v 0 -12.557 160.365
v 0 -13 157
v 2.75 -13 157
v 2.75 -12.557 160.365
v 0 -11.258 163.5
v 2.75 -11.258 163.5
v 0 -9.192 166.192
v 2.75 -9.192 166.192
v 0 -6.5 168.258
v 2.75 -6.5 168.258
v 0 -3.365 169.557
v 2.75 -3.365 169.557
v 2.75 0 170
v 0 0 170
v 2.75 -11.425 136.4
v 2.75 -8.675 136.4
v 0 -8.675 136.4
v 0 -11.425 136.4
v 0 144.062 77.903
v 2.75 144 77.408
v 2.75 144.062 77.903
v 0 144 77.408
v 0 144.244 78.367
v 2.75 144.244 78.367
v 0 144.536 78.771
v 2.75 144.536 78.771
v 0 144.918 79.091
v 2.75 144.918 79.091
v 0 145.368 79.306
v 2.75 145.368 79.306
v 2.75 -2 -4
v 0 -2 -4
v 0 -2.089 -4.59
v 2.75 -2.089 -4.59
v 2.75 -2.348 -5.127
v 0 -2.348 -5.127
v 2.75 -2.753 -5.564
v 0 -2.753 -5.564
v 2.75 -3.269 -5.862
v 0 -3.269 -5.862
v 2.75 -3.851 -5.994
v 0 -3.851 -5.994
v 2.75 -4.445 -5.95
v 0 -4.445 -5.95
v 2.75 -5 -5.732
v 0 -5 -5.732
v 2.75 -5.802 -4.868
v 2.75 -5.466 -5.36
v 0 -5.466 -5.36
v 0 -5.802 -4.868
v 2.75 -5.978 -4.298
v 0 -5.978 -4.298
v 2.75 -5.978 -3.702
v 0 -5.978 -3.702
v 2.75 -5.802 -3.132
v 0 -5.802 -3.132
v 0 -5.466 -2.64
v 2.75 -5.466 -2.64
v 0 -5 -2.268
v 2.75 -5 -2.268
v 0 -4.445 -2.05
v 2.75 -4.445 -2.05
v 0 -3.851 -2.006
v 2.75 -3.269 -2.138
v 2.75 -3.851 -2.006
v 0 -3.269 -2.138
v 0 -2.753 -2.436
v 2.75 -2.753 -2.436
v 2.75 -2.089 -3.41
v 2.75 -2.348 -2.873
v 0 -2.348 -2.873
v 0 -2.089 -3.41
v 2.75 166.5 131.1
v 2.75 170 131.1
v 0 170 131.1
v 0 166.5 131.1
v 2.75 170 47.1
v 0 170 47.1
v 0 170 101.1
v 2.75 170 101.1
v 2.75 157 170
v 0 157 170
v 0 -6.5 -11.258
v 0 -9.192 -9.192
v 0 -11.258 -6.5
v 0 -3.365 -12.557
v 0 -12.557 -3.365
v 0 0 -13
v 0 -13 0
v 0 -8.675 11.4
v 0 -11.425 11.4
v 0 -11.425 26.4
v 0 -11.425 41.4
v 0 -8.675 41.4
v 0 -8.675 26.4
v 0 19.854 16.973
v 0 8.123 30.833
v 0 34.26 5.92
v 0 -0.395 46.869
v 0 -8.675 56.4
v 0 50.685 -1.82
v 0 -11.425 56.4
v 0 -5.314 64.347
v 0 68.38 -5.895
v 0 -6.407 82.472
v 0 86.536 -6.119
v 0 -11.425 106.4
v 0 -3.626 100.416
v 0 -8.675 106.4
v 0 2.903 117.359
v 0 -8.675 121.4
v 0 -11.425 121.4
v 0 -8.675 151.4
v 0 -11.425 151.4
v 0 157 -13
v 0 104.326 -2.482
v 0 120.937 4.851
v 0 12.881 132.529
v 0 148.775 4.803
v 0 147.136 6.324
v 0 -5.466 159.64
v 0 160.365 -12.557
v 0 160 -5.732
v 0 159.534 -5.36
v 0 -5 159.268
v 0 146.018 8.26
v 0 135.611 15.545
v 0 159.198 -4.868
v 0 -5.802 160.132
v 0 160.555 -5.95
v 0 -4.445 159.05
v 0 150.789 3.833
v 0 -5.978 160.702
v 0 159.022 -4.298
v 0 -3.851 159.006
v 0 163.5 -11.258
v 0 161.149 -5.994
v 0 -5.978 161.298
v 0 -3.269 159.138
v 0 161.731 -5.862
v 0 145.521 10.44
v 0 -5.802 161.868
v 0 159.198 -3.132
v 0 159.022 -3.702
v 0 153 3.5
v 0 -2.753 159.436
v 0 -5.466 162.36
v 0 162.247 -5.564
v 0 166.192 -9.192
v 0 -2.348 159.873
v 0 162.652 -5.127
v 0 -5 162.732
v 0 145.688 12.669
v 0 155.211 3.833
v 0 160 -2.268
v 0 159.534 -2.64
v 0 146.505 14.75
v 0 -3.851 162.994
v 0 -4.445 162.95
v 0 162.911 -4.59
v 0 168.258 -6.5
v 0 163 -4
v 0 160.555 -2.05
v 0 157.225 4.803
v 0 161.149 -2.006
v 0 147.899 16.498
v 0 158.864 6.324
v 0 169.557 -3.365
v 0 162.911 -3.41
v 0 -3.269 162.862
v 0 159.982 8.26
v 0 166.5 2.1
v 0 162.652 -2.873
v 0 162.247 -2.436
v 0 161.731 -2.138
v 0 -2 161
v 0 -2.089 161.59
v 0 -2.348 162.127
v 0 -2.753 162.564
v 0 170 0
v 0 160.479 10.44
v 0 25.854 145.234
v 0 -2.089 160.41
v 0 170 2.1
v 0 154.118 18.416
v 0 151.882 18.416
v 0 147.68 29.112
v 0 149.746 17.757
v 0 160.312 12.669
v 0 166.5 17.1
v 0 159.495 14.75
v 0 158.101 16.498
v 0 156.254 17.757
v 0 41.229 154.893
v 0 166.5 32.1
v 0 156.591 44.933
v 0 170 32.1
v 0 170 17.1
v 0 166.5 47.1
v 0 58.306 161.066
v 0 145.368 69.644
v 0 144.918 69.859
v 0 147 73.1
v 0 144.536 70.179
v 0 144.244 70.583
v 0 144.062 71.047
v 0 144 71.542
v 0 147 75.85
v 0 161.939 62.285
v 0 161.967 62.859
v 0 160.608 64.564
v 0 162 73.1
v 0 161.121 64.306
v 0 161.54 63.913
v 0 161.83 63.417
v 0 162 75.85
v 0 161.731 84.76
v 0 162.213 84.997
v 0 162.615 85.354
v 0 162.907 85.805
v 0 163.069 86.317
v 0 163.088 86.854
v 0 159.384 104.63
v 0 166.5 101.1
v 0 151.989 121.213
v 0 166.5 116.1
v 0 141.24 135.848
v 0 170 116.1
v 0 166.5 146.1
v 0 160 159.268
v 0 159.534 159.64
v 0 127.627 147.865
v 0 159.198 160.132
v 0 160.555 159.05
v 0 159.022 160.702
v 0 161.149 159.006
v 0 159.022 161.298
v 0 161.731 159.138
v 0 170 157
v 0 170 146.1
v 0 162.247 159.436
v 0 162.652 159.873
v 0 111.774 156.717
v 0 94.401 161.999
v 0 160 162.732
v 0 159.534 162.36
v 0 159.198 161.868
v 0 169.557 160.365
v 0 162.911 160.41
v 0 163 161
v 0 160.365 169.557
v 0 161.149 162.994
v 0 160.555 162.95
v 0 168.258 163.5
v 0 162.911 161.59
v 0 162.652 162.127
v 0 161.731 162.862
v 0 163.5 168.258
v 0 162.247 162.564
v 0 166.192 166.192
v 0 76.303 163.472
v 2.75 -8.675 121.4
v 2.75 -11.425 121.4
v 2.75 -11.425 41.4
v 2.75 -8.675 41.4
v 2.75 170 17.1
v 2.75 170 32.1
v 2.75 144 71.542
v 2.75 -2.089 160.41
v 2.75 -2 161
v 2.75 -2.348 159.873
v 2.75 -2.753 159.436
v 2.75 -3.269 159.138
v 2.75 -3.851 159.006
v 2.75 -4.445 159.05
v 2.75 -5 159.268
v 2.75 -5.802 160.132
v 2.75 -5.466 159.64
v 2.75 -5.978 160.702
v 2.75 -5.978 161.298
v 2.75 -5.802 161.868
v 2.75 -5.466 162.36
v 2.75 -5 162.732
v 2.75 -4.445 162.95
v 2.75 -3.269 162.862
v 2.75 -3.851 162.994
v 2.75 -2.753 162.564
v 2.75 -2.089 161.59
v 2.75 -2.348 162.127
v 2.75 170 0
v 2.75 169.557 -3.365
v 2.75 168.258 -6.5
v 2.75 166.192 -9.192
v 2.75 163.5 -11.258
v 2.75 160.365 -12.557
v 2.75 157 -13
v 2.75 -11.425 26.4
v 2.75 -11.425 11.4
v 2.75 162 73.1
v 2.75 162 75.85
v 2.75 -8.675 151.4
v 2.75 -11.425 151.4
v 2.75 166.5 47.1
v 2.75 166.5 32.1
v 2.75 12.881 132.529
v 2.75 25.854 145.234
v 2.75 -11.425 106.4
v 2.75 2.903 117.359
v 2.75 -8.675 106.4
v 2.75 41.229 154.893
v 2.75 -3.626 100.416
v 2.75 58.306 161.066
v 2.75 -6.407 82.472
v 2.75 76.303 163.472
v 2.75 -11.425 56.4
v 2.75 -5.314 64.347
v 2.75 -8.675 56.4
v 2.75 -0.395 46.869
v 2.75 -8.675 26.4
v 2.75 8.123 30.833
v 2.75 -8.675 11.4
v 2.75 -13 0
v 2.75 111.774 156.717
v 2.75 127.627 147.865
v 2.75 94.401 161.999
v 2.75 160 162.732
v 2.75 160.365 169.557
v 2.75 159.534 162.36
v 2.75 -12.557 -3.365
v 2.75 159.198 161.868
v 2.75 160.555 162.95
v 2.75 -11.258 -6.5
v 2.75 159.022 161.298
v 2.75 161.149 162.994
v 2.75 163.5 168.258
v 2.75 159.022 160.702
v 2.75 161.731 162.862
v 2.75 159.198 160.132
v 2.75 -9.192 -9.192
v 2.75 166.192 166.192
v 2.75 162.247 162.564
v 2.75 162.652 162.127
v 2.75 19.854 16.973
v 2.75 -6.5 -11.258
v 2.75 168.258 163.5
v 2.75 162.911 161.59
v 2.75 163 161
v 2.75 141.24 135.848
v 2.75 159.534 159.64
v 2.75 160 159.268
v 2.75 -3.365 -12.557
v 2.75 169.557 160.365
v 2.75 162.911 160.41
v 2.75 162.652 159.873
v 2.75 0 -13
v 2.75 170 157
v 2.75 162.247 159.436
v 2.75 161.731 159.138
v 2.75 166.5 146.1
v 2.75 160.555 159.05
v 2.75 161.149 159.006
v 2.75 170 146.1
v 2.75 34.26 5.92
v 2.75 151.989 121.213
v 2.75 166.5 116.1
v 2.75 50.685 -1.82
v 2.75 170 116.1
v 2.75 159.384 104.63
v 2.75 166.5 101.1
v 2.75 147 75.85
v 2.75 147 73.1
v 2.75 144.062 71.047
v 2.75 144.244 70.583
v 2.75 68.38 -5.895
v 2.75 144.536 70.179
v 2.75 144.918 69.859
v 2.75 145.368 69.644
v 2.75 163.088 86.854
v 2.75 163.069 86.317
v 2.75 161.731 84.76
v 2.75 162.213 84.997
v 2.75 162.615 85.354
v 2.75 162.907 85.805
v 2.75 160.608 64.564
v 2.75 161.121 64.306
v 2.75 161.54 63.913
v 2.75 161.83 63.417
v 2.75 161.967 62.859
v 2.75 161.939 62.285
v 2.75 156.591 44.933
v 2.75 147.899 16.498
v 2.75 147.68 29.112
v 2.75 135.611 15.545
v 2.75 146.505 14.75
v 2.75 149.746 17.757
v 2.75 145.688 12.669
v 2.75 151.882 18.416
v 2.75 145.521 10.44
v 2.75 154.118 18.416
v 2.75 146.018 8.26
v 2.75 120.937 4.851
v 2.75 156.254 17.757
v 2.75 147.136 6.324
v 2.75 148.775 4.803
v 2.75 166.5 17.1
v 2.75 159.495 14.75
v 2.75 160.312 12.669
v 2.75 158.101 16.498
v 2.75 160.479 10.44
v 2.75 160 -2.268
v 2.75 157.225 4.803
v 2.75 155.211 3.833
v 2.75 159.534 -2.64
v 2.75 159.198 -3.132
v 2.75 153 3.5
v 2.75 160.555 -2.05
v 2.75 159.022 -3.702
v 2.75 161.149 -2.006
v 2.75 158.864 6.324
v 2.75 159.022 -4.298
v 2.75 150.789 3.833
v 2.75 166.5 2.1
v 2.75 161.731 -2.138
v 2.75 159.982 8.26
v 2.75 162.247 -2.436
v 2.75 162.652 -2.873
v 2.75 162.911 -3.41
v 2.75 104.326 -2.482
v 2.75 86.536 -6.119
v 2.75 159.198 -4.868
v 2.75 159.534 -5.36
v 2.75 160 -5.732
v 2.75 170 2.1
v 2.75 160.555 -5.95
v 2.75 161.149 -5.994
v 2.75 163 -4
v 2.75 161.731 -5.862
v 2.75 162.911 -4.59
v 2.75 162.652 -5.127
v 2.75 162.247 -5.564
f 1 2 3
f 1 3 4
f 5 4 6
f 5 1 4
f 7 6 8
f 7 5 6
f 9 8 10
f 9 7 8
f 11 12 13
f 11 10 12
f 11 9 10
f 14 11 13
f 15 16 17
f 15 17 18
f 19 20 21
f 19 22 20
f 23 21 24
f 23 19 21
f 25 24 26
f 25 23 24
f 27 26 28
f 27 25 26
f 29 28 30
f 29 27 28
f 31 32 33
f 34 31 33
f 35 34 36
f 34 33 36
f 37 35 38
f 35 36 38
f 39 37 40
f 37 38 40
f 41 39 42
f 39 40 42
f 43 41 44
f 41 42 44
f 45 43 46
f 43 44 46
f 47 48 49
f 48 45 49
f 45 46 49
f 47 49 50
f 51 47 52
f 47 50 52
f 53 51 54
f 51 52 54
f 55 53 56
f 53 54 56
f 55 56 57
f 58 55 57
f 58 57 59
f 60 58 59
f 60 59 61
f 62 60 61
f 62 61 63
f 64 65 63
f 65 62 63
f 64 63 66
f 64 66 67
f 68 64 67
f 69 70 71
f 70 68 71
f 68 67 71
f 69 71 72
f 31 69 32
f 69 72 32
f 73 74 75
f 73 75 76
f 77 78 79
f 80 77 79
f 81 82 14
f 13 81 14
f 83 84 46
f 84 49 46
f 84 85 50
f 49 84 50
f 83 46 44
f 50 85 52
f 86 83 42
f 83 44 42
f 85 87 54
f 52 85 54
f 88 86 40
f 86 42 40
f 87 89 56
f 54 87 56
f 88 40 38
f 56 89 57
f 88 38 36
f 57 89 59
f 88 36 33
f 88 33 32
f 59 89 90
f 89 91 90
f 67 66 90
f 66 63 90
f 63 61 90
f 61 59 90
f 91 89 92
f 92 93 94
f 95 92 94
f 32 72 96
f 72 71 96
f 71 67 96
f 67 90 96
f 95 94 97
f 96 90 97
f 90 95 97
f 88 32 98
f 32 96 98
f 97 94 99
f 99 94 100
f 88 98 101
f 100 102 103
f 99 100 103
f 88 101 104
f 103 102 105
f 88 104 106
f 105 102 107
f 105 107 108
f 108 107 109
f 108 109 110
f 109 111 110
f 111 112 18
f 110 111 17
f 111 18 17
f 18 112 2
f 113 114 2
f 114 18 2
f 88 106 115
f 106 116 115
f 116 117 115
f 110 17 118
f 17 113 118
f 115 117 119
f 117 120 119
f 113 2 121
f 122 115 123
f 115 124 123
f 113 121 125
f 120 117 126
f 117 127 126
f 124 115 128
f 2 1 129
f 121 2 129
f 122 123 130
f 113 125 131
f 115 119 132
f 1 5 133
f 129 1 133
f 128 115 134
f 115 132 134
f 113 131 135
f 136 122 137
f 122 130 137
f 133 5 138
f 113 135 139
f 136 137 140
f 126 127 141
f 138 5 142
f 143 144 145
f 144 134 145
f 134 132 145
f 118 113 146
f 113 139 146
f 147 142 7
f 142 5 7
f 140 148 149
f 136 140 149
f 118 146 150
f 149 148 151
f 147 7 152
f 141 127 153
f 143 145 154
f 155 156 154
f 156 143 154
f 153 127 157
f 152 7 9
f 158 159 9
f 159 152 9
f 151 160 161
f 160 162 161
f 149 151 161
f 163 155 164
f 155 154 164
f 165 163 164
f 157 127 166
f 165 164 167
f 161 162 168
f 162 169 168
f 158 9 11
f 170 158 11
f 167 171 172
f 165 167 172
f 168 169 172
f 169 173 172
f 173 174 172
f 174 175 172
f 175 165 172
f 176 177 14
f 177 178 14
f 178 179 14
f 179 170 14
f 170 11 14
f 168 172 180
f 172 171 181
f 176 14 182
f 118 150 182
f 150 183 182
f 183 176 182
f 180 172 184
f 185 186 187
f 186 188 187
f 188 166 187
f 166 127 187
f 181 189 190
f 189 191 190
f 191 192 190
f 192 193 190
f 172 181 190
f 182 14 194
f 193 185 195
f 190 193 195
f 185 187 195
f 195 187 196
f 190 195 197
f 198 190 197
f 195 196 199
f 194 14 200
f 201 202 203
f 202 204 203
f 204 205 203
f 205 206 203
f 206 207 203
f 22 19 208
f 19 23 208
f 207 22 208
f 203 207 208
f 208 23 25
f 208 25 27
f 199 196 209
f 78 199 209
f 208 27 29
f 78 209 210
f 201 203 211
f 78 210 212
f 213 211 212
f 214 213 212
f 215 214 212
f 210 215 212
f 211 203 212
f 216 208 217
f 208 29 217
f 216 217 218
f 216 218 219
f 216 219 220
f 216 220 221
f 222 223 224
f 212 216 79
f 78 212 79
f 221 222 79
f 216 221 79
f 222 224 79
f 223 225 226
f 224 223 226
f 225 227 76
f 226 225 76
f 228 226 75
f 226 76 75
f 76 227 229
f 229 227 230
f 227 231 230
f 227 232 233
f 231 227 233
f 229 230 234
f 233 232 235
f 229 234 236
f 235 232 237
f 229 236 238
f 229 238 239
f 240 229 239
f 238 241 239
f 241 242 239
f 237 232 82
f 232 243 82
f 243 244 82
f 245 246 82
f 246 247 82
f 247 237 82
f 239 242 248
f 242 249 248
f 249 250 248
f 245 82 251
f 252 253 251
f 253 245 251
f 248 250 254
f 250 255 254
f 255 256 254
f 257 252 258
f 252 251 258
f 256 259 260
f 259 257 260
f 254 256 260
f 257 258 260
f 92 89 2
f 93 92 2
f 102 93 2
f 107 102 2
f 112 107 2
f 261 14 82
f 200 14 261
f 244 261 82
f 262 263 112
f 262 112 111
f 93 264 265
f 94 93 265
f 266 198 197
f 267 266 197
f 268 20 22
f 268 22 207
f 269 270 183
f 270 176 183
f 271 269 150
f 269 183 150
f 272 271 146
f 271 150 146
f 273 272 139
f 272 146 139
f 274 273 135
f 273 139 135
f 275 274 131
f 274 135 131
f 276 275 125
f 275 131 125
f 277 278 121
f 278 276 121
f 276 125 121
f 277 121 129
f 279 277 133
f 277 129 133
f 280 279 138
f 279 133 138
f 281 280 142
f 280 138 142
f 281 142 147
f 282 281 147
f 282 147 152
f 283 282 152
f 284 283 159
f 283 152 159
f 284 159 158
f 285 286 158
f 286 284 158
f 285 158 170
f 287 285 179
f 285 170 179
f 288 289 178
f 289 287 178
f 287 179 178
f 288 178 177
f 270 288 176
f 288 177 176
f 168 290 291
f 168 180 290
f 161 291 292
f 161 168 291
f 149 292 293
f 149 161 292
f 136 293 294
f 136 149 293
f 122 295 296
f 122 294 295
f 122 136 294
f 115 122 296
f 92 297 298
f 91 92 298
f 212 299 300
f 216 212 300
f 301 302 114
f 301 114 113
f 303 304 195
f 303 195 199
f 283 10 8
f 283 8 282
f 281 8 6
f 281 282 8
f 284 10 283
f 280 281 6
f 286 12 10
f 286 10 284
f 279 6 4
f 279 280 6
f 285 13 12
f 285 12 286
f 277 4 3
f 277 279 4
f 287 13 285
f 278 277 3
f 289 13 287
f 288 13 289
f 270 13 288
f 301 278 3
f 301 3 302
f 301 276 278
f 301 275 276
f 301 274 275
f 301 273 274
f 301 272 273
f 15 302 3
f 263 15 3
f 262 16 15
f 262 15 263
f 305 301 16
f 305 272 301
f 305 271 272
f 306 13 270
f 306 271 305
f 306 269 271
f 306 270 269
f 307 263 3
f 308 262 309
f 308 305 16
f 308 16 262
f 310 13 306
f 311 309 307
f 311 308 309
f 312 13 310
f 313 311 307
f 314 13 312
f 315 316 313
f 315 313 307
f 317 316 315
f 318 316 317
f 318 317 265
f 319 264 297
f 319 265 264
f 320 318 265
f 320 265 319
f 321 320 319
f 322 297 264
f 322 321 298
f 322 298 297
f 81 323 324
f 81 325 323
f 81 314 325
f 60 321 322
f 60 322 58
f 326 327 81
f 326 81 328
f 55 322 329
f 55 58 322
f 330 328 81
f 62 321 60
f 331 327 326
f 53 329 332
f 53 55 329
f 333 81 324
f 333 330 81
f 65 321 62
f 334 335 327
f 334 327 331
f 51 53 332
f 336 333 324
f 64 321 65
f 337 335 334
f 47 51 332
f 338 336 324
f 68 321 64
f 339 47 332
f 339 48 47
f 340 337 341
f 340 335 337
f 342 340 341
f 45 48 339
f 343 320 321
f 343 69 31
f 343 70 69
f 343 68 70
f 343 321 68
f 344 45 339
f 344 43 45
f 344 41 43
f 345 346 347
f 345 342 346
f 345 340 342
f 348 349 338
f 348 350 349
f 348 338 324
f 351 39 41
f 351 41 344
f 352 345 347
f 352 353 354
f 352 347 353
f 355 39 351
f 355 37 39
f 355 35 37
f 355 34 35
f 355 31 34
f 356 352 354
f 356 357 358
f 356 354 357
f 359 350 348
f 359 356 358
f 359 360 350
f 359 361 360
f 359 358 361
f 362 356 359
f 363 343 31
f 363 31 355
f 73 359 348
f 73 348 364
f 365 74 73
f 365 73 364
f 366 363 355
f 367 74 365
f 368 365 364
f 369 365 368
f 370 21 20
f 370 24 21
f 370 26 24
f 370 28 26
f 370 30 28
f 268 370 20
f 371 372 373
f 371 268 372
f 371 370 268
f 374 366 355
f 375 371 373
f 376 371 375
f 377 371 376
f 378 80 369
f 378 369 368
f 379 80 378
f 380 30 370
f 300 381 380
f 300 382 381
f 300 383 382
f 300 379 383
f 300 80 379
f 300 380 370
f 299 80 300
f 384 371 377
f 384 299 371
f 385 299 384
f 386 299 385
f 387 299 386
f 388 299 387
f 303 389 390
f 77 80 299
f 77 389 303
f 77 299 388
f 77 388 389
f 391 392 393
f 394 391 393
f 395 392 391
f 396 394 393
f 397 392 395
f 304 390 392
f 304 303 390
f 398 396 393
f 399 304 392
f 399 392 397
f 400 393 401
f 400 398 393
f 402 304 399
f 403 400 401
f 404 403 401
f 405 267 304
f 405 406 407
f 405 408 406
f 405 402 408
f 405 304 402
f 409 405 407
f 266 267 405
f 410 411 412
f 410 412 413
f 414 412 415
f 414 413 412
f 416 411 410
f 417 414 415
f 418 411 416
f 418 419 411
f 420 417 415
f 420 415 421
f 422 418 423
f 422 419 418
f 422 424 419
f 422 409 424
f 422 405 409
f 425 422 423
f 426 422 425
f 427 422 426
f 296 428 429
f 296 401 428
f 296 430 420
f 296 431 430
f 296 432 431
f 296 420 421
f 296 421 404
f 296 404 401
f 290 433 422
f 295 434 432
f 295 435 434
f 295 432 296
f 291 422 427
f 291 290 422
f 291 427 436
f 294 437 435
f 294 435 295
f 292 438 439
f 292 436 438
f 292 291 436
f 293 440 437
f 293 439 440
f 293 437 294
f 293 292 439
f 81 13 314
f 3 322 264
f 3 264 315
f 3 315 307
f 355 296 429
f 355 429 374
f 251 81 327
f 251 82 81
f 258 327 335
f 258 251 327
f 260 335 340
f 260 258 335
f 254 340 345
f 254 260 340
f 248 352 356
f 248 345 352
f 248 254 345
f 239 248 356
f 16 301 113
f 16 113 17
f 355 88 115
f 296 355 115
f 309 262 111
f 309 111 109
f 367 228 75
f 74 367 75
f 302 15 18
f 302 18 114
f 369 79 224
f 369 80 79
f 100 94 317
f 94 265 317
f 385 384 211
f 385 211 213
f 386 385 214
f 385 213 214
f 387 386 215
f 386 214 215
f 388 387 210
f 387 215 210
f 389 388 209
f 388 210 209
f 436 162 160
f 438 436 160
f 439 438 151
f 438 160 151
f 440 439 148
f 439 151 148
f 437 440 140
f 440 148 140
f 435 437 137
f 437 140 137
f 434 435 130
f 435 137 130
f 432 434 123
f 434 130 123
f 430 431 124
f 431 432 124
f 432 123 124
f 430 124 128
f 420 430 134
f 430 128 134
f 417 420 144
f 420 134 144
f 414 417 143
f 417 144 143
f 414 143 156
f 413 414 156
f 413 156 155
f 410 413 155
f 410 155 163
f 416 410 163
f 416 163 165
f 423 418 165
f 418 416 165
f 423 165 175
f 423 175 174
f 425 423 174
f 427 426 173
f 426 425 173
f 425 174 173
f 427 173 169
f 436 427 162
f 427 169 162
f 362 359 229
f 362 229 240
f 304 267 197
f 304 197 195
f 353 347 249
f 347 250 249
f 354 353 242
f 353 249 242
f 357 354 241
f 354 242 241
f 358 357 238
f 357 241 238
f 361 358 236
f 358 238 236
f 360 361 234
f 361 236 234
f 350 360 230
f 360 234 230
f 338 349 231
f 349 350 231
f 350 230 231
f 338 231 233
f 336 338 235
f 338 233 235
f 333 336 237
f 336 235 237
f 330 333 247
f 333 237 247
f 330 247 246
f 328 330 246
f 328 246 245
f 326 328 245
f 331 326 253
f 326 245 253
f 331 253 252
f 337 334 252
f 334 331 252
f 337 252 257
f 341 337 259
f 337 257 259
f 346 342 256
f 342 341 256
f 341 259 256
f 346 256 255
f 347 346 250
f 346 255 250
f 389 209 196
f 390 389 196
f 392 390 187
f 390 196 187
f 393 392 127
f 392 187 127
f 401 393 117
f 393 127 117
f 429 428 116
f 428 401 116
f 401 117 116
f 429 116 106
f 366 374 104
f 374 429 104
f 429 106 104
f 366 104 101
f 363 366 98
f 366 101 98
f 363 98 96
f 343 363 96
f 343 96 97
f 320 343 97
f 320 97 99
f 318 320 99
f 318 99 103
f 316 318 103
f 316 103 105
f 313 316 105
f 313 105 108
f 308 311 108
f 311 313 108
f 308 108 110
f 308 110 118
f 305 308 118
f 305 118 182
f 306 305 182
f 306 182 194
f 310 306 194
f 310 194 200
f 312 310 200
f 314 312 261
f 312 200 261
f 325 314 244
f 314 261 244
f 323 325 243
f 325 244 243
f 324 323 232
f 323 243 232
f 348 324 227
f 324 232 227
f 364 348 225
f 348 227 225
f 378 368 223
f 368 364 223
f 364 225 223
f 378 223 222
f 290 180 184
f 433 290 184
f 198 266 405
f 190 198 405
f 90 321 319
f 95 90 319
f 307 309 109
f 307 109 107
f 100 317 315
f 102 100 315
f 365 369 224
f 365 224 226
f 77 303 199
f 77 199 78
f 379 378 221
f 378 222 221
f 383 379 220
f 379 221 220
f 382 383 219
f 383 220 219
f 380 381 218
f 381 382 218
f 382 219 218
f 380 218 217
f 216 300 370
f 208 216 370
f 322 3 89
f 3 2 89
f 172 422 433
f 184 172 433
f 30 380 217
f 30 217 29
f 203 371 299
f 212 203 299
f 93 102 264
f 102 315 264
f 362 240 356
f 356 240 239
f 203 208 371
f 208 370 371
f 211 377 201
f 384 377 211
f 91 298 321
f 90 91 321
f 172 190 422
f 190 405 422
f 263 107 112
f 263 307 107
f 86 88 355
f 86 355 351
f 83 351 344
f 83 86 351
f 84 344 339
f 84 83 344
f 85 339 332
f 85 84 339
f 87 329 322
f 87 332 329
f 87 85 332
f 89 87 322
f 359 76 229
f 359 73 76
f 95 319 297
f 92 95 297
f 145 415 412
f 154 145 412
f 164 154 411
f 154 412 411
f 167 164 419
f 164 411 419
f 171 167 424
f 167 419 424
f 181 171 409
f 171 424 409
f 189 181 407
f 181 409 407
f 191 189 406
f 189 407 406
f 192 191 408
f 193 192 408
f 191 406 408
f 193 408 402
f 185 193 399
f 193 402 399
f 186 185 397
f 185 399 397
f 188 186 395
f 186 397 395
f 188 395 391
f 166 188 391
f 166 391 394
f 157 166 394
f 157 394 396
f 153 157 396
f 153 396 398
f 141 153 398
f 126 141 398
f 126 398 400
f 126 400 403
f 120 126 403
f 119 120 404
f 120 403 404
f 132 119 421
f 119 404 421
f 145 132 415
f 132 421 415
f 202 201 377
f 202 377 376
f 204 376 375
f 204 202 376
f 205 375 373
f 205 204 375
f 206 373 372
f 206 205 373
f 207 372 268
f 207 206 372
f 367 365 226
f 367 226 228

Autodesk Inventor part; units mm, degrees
ref_plane "YZ Plane" through (0, 0, 0) normal (1, 0, 0) x (0, 1, 0)
ref_plane "XZ Plane" through (0, 0, 0) normal (0, 1, 0) x (-1, 0, 0)
ref_plane "XY Plane" through (0, 0, 0) normal (0, 0, 1) x (1, 0, 0)
sketch "Sketch1" plane through (0, 0, 0) normal (1, 0, 0) x (0, 1, 0)
  circle A0 centre (-4, -4) radius 2
  circle A1 centre (78.5, 78.5) radius 85
  circle A2 centre (161, -4) radius 2
  circle A3 centre (-4, 161) radius 2
  circle A4 centre (161, 161) radius 2
  line L0 (157, 170) -> (0, 170)
  arc A5 (0, 170) -> (-13, 157) centre (0, 157) ccw
  line L1 (-13, 157) -> (-13, 0)
  arc A6 (-13, 0) -> (0, -13) centre (0, 0) ccw
  line L2 (0, -13) -> (157, -13)
  arc A7 (157, -13) -> (170, 0) centre (157, 0) ccw
  line L3 (170, 0) -> (170, 157)
  arc A8 (170, 157) -> (157, 170) centre (157, 157) ccw
  line L4 (-4, 161) -> (161, 161) construction
  line L5 (161, 161) -> (161, -4) construction
  line L6 (161, -4) -> (-4, -4) construction
  line L7 (-4, -4) -> (-4, 161) construction
  line L8 (-4, 161) -> (161, -4) construction
  line L9 (-13, 78.5) -> (78.5, 78.5) construction
  line L10 (78.5, 78.5) -> (170, 78.5) construction
  dimension "d10" = 183
  dimension "d11" = 183
  dimension "d12" = 165
  dimension "d13" = 165
  dimension "d15" = 13
  dimension "d16" = 4
  dimension "d17" = 170
extrude "Extrusion1" add sketch "Sketch1" along normal blind 2.75
sketch "Sketch2" plane through (2.75, 0, 0) normal (1, 0, 0) x (0, 0, -1)
  line L0 (0, 170) -> (-157, 170) projected
  line L1 (-146.1, 170) -> (-131.1, 170)
  line L2 (-131.1, 170) -> (-131.1, 166.5)
  line L3 (-131.1, 166.5) -> (-146.1, 166.5)
  line L4 (-146.1, 166.5) -> (-146.1, 170)
  line L5 (-116.1, 170) -> (-101.1, 170)
  line L6 (-101.1, 170) -> (-101.1, 166.5)
  line L7 (-101.1, 166.5) -> (-116.1, 166.5)
  line L8 (-116.1, 166.5) -> (-116.1, 170)
  line L9 (-47.1, 170) -> (-32.1, 170)
  line L10 (-32.1, 170) -> (-32.1, 166.5)
  line L11 (-32.1, 166.5) -> (-47.1, 166.5)
  line L12 (-47.1, 166.5) -> (-47.1, 170)
  line L13 (-2.1, 170) -> (-17.1, 170)
  line L14 (-17.1, 170) -> (-17.1, 166.5)
  line L15 (-17.1, 166.5) -> (-2.1, 166.5)
  line L16 (-2.1, 166.5) -> (-2.1, 170)
  circle A0 centre (-161, 161) radius 2 projected
  point P0 (0, 0)
  dimension "d2" = 15
  dimension "d3" = 30
  dimension "d4" = 69
  dimension "d5" = 30
  dimension "d6" = 3.5
  dimension "d7" = 14.9
extrude "Extrusion2" cut sketch "Sketch2" against normal blind 10 contours L16 L15 L14 L0 | L2 L3 L4 L0 | L6 L7 L8 L0 | L10 L11 L12 L0
sketch "Sketch3" plane through (2.75, 0, 0) normal (1, 0, 0) x (0, 0, -1)
  line L0 (-56.4, -11.425) -> (-41.4, -11.425)
  line L1 (-41.4, -11.425) -> (-41.4, -8.675)
  line L2 (-41.4, -8.675) -> (-56.4, -8.675)
  line L3 (-56.4, -8.675) -> (-56.4, -11.425)
  line L4 (-26.4, -11.425) -> (-11.4, -11.425)
  line L5 (-11.4, -11.425) -> (-11.4, -8.675)
  line L6 (-11.4, -8.675) -> (-26.4, -8.675)
  line L7 (-26.4, -8.675) -> (-26.4, -11.425)
  line L8 (-106.4, -11.425) -> (-121.4, -11.425)
  line L9 (-121.4, -11.425) -> (-121.4, -8.675)
  line L10 (-121.4, -8.675) -> (-106.4, -8.675)
  line L11 (-106.4, -8.675) -> (-106.4, -11.425)
  line L12 (-136.4, -11.425) -> (-151.4, -11.425)
  line L13 (-151.4, -11.425) -> (-151.4, -8.675)
  line L14 (-151.4, -8.675) -> (-136.4, -8.675)
  line L15 (-136.4, -8.675) -> (-136.4, -11.425)
  line L16 (-157, -13) -> (0, -13) projected
  circle A0 centre (-161, -4) radius 2 projected
  point P0 (0, 0)
  dimension "d18" = 1.575
  dimension "d19" = 30
  dimension "d20" = 65
  dimension "d21" = 30
  dimension "d22" = 2.75
  dimension "d23" = 9.6
  dimension "d26" = 15
extrude "Extrusion3" cut sketch "Sketch3" against normal blind 10 contours L3 L2 L1 L0 | L7 L6 L5 L4 | L8 L9 L10 L11 | L12 L13 L14 L15
sketch "Sketch4" plane through (2.75, 0, 0) normal (1, 0, 0) x (0, 0, -1)
  line L0 (-75.85, 147) -> (-73.1, 147)
  line L1 (-73.1, 147) -> (-73.1, 162)
  line L2 (-73.1, 162) -> (-75.85, 162)
  line L3 (-75.85, 162) -> (-75.85, 147)
  line L4 (-78.85, 144) -> (-70.1, 144)
  line L5 (-70.1, 144) -> (-63.1, 165)
  line L6 (-63.1, 165) -> (-85.85, 165)
  line L7 (-85.85, 165) -> (-78.85, 144)
  line L8 (-47.1, 170) -> (-101.1, 170) projected
  line L9 (-47.1, 166.5) -> (-47.1, 170) projected
  point P0 (0, 0)
  dimension "d27" = 8
  dimension "d28" = 26
  dimension "d29" = 2.75
  dimension "d30" = 15
  dimension "d31" = 3
  dimension "d32" = 3
  dimension "d33" = 3
  dimension "d34" = 10
  dimension "d35" = 10
  dimension "d36" = 5
extrude "Extrusion4" add sketch "Sketch4" against normal up to surface (2.75 mm away)
fillet "Fillet1" radius 2 4 edges at (1.375, 144, 78.85) (1.375, 144, 70.1) (1.375, 163.2307, 85.2602) (1.375, 162.2566, 64.0145)
sketch "Sketch5" plane through (2.75, 0, 0) normal (1, 0, 0) x (0, 0, -1)
  circle A0 centre (-11, 153) radius 7.5
  circle A1 centre (4, 161) radius 2 projected
  point P0 (0, 0)
  dimension "d40" = 15
  dimension "d41" = 15
  dimension "d42" = 8
extrude "Extrusion5" cut sketch "Sketch5" against normal blind 10 contours A0
properties part number "TrayPanelD_180mm"
